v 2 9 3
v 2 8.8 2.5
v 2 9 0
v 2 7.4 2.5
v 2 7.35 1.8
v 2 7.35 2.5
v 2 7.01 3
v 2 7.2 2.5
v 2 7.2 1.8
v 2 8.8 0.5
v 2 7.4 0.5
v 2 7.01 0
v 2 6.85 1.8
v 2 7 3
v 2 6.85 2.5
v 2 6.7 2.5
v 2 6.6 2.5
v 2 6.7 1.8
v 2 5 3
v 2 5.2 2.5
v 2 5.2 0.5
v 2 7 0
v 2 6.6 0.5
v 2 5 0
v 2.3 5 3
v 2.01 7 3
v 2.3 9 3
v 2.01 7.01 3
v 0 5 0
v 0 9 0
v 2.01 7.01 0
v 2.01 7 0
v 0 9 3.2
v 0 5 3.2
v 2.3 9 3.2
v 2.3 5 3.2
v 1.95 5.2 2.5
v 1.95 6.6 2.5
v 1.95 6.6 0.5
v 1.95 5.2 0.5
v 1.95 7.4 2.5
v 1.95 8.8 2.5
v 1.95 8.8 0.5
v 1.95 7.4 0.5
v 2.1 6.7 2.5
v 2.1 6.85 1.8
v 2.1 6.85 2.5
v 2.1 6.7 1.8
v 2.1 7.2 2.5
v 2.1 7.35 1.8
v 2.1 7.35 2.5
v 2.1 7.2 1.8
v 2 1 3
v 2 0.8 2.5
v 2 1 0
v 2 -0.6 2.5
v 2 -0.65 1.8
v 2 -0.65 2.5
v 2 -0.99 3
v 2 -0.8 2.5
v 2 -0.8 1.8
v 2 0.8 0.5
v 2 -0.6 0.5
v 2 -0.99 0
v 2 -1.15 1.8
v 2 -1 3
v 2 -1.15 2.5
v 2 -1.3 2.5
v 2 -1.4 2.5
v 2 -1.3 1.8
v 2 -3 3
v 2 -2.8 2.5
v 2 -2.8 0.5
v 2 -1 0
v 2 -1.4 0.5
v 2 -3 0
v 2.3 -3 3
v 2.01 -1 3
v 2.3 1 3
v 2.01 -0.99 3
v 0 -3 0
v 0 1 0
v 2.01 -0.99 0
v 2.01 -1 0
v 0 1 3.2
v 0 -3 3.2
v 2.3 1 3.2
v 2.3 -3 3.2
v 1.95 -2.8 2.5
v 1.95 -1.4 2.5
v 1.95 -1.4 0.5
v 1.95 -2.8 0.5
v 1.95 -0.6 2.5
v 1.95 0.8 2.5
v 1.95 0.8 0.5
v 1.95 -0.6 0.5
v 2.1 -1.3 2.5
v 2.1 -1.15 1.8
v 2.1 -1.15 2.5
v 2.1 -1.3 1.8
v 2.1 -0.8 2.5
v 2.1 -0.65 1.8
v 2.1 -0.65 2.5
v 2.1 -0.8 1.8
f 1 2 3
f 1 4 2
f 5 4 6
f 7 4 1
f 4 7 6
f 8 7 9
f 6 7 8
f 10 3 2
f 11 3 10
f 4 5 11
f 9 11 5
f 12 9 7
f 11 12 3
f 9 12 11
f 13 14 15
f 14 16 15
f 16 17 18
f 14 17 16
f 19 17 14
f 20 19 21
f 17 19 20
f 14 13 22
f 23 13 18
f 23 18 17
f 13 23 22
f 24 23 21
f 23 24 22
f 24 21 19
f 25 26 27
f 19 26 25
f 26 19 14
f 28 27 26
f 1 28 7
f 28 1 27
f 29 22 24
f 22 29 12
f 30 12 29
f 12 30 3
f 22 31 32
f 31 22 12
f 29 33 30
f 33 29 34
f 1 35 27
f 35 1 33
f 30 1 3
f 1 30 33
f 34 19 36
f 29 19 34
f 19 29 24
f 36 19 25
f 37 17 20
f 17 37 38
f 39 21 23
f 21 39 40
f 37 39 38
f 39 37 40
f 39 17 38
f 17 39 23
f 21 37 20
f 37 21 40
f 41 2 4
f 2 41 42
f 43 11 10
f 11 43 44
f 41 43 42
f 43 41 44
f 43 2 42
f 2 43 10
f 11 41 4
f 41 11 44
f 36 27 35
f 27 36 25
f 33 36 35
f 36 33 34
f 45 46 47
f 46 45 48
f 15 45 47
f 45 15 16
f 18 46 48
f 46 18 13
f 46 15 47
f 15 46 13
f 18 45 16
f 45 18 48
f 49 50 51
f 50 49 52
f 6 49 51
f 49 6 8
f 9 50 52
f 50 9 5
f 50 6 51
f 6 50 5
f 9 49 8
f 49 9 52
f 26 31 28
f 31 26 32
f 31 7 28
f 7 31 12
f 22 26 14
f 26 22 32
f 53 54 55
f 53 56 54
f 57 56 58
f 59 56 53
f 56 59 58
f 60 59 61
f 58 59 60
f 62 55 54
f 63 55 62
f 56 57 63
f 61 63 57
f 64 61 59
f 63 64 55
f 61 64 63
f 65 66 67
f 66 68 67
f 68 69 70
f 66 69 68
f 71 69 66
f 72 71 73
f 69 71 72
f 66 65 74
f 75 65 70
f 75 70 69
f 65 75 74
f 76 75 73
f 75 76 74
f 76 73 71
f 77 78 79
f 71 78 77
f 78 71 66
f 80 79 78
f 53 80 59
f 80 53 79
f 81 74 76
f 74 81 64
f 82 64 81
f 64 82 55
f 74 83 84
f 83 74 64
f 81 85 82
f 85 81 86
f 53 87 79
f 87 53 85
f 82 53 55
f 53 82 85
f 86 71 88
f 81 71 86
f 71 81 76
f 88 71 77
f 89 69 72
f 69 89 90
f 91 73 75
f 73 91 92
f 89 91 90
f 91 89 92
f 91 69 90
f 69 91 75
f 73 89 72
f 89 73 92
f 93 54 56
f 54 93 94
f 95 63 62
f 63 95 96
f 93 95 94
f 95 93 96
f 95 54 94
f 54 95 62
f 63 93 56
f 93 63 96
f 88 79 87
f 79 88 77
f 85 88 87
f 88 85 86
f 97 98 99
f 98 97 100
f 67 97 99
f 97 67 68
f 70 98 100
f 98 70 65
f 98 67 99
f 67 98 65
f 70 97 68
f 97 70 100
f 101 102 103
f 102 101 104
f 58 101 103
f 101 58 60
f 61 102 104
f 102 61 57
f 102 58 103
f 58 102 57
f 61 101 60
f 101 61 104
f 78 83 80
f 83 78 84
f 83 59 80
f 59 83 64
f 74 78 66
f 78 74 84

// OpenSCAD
// file: Asset_SCAD/Base_cabinet_Wood.scad
module Base_cabinet_Wood(){

    translate([0,0,3])
    color("#8b6914")
    cube([2.3,4,0.2]);

    difference(){
    color("#cdaa7d")
    cube([2,4,3]);

    translate([1.95,0.2,0.5])
    color("#cdaa6f")
    cube([0.1,1.4,2]);

    translate([1.95 ,2.4,0.5])
    color("#cdaa6f")
    cube([0.1,1.4,2]);
    }

    translate([2,1.7,1.8])
    color("#8b6914")
    cube([0.1,0.15,0.7]);


    translate([2,2.2,1.8])
    color("#8b6914")
    cube([0.1,0.15,0.7]);


    translate([2,2,0])
    color("#000000")
    cube([0.01,0.01,3]);

}

Base_cabinet_Wood();
// file: Asset_SCAD/Base_cabinet_Gray.scad
module Base_cabinet_Gray(){

translate([0,0,3])
color("#c2c2c2")
cube([2.3,4,0.2]);

color("#9e9e9e")
cube([2,4,3]);

translate([2,1.5,0.8])
color("#c2c2c2")
cube([0.1,0.15,2]);


translate([2,2.5,0.8])
color("#c2c2c2")
cube([0.1,0.15,2]);


translate([2,2,0])
color("#000000")
cube([0.01,0.01,3]);

}

Base_cabinet_Gray();
// main file
use <Asset_SCAD/Base_cabinet_Gray.scad>
use <Asset_SCAD/Base_cabinet_Wood.scad>


translate([0,5,0])
Base_cabinet_Wood();

translate([0,-3,0])
Base_cabinet_Wood();
